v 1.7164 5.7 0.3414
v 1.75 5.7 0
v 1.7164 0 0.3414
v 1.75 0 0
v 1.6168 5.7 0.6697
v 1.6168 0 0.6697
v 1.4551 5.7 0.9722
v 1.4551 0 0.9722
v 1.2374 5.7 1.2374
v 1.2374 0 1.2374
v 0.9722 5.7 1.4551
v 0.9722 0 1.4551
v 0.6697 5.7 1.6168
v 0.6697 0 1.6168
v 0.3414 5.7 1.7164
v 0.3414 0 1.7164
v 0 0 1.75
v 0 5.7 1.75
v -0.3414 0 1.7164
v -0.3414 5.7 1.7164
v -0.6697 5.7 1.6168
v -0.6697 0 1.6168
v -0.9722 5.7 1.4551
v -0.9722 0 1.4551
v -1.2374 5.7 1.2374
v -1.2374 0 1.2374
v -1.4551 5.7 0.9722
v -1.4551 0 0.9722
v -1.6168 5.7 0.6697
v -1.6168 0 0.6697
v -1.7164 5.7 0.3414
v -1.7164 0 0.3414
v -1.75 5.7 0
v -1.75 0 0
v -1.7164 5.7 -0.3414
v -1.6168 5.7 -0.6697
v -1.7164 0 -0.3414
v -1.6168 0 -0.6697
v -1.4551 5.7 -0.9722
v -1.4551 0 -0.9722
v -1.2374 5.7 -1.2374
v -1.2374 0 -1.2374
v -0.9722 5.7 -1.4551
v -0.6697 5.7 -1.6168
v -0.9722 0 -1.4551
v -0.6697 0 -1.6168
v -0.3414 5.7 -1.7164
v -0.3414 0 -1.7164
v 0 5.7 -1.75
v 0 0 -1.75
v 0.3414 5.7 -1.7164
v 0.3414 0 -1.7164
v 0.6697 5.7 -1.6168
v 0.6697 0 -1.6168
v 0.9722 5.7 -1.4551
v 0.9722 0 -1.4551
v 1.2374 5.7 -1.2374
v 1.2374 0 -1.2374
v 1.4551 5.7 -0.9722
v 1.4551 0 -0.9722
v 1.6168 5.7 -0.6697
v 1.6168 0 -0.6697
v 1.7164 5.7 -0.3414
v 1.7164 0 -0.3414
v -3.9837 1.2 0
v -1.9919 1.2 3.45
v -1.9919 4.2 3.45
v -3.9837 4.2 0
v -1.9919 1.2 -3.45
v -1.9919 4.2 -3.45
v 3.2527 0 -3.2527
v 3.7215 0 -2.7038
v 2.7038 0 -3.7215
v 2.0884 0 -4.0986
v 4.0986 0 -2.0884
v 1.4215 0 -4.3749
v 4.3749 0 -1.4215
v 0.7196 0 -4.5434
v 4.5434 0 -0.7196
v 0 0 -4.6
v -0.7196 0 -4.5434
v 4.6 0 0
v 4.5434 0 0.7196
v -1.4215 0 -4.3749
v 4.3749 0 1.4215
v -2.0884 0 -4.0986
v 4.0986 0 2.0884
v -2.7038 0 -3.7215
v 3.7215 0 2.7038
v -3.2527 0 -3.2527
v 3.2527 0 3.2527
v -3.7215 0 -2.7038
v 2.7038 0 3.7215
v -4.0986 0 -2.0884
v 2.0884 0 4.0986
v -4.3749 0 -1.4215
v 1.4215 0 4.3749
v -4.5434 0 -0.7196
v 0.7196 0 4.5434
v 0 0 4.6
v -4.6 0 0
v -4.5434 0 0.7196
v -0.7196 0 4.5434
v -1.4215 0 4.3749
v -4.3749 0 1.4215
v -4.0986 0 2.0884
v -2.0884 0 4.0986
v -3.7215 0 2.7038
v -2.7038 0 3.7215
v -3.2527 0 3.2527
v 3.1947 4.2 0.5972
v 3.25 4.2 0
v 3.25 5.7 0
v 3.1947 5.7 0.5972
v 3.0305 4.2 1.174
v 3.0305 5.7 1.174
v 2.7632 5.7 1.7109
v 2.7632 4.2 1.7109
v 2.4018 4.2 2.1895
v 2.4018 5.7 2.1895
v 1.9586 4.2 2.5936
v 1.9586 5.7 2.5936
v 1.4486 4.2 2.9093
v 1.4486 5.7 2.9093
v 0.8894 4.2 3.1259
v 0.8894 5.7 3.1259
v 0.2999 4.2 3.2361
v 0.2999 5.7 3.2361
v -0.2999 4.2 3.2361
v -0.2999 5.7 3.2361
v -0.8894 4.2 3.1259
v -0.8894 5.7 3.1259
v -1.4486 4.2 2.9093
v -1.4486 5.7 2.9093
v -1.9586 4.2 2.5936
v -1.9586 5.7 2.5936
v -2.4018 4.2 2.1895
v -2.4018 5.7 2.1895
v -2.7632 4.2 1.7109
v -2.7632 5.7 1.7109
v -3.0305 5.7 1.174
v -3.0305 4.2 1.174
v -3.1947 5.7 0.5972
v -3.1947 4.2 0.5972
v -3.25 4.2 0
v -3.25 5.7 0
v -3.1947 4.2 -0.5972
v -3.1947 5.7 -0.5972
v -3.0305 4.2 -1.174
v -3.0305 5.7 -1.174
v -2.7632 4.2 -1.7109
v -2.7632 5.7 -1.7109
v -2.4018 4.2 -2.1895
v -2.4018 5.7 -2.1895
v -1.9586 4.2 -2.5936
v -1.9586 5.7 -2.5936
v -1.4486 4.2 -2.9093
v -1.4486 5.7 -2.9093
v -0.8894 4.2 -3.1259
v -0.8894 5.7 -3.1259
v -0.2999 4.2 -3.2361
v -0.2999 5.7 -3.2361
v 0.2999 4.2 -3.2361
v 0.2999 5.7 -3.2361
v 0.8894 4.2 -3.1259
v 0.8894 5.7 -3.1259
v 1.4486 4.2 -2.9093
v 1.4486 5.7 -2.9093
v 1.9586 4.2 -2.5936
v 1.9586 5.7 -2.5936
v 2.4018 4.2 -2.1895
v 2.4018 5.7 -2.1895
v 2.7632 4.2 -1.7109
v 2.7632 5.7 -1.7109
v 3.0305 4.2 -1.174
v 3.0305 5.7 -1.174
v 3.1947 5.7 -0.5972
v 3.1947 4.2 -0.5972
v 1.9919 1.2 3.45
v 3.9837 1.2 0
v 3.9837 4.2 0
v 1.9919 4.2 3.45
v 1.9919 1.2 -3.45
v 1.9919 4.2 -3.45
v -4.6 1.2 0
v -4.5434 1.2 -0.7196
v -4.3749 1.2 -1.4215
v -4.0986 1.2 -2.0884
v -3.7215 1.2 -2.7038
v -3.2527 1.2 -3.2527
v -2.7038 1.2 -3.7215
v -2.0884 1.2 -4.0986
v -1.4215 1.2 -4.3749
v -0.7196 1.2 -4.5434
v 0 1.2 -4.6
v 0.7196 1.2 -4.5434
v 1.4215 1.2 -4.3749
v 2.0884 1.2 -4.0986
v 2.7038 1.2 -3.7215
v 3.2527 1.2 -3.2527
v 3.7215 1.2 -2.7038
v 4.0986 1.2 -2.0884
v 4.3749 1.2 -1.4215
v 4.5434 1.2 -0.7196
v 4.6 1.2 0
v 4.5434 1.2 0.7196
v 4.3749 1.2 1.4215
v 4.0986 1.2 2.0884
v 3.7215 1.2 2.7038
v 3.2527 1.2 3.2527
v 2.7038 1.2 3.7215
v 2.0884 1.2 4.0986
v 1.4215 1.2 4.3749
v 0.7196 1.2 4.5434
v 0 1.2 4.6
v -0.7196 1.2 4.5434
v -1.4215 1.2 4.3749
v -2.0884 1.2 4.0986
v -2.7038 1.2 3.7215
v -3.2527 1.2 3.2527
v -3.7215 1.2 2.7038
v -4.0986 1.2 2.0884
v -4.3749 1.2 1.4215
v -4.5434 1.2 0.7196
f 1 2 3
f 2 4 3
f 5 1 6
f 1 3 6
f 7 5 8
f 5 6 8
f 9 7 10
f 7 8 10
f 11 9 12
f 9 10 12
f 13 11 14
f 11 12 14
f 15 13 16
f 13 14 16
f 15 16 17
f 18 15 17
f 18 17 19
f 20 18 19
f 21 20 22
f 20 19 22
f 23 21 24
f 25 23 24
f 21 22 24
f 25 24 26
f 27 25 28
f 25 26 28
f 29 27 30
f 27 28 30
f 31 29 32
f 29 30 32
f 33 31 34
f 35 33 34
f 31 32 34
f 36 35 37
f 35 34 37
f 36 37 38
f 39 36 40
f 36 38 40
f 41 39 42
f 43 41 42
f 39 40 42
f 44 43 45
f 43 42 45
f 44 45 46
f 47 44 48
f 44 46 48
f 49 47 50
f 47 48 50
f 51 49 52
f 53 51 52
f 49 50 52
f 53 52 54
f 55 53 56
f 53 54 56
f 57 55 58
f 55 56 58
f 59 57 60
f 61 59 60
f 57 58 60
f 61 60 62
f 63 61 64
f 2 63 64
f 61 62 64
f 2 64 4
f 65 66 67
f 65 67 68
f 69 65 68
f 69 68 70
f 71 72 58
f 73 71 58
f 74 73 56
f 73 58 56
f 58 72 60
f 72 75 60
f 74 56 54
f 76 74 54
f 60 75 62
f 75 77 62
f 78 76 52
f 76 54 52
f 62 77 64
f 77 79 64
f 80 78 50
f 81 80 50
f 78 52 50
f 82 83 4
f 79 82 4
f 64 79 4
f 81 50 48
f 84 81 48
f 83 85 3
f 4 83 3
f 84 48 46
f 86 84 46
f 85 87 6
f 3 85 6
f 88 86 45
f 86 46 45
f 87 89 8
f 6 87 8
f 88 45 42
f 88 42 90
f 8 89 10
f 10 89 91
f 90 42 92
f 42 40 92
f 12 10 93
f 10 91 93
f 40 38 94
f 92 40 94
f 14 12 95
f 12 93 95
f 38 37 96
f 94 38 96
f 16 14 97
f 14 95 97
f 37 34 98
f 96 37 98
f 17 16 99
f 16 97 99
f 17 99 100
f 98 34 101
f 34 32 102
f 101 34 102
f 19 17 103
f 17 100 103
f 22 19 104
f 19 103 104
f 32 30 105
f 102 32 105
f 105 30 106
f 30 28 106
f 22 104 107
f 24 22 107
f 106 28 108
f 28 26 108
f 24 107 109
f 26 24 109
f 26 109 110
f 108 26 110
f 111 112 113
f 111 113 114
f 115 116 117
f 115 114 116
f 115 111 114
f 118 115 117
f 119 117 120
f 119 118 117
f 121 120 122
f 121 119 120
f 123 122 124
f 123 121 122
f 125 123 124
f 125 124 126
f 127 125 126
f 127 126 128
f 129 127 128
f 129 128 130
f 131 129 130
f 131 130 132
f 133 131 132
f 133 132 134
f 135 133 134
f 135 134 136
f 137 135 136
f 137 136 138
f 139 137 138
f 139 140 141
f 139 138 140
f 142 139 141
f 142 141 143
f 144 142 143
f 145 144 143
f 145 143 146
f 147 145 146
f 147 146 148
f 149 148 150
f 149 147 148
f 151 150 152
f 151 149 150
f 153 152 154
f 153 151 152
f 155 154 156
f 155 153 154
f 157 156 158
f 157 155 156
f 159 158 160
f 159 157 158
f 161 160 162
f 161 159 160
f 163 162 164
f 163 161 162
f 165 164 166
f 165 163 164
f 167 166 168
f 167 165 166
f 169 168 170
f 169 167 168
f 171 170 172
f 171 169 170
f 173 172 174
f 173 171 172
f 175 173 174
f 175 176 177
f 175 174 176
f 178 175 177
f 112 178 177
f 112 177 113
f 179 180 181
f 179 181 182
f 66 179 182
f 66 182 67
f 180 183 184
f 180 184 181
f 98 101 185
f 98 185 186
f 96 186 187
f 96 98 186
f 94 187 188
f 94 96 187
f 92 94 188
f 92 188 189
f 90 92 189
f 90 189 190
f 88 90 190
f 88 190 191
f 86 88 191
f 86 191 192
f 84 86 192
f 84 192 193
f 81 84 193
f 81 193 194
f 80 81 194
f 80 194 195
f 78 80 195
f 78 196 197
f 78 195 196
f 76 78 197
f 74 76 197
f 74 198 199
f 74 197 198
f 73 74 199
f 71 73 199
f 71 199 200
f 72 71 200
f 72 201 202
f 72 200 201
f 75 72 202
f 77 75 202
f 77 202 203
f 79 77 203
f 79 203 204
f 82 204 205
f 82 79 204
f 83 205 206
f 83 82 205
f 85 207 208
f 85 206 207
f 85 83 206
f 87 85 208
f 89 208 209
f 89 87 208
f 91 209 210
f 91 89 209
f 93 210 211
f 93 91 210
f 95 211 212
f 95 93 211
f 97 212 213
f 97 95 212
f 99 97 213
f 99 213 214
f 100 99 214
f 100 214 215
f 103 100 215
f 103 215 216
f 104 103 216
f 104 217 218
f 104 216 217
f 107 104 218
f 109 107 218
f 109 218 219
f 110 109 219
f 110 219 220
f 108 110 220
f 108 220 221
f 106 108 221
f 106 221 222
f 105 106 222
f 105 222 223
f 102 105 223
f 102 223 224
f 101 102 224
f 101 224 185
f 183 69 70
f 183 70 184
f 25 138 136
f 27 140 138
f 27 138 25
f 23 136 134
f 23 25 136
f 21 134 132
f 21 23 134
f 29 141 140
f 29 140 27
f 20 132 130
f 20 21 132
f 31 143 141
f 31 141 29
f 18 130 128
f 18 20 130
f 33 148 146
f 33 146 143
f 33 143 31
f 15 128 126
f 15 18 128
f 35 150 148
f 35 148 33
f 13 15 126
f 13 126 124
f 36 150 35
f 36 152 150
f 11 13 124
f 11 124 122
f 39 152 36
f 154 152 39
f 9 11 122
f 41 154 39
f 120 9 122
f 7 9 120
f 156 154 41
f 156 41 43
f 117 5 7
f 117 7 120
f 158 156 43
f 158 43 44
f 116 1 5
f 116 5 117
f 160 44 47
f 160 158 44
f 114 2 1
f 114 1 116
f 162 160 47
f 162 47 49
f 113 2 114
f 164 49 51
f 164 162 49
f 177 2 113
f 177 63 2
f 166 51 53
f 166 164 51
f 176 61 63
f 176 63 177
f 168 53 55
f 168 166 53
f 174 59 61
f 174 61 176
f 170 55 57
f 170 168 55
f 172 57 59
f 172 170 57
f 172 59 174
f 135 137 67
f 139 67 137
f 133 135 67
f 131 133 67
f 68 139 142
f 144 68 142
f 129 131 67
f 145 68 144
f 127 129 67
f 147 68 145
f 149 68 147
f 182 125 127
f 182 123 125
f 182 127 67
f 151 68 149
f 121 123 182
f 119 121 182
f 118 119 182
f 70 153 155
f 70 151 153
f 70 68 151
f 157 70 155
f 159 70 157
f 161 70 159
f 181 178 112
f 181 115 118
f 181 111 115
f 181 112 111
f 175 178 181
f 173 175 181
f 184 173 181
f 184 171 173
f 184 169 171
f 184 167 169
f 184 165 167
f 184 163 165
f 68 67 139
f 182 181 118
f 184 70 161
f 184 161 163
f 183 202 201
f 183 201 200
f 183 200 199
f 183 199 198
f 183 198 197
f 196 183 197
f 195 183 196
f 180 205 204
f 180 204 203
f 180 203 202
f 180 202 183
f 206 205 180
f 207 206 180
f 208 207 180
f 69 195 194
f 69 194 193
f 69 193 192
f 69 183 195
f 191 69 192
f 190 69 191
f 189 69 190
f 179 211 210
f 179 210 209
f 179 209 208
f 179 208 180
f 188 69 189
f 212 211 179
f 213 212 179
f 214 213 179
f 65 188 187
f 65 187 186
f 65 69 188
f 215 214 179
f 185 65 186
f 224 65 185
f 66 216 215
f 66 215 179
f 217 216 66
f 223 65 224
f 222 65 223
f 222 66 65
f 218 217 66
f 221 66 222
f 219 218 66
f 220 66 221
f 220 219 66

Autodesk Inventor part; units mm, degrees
ref_plane "YZ Plane" through (0, 0, 0) normal (1, 0, 0) x (0, 1, 0)
ref_plane "XZ Plane" through (0, 0, 0) normal (0, 1, 0) x (-1, 0, 0)
ref_plane "XY Plane" through (0, 0, 0) normal (0, 0, 1) x (1, 0, 0)
sketch "Sketch1" plane through (0, 0, 0) normal (0, 1, 0) x (-1, 0, 0)
  circle A0 centre (0, 0) radius 4.6
  dimension "d0" = 9.2
extrude "Extrusion1" add sketch "Sketch1" along normal blind 1.2
sketch "Sketch2" plane through (0, 1.2, 0) normal (0, 1, 0) x (1, 0, 0)
  line L0 (-3.9837, 0) -> (-1.9919, 3.45)
  line L1 (-1.9919, 3.45) -> (1.9919, 3.45)
  line L2 (1.9919, 3.45) -> (3.9837, 0)
  line L3 (3.9837, 0) -> (1.9919, -3.45)
  line L4 (1.9919, -3.45) -> (-1.9919, -3.45)
  line L5 (-1.9919, -3.45) -> (-3.9837, 0)
  point P0 (0, 0)
  point P1 (0, 0)
  dimension "d3" = 6.9
extrude "Extrusion2" add sketch "Sketch2" along normal blind 3
sketch "Sketch3" plane through (0, 4.2, 0) normal (0, 1, 0) x (1, 0, 0)
  circle A0 centre (0, 0) radius 3.25
  dimension "d6" = 6.5
extrude "Extrusion3" add sketch "Sketch3" along normal blind 1.5
sketch "Sketch4" plane through (0, 0, 0) normal (0, -1, 0) x (1, 0, 0)
  circle A0 centre (0, 0) radius 1.75
  dimension "d9" = 3.5
extrude "Extrusion4" cut sketch "Sketch4" against normal through all
thread "Thread1" size "M4x0.7" class "6H" standard "ANSI Metric M Profile" full length
properties part number "H003_Tuerca_M4X5_7"
